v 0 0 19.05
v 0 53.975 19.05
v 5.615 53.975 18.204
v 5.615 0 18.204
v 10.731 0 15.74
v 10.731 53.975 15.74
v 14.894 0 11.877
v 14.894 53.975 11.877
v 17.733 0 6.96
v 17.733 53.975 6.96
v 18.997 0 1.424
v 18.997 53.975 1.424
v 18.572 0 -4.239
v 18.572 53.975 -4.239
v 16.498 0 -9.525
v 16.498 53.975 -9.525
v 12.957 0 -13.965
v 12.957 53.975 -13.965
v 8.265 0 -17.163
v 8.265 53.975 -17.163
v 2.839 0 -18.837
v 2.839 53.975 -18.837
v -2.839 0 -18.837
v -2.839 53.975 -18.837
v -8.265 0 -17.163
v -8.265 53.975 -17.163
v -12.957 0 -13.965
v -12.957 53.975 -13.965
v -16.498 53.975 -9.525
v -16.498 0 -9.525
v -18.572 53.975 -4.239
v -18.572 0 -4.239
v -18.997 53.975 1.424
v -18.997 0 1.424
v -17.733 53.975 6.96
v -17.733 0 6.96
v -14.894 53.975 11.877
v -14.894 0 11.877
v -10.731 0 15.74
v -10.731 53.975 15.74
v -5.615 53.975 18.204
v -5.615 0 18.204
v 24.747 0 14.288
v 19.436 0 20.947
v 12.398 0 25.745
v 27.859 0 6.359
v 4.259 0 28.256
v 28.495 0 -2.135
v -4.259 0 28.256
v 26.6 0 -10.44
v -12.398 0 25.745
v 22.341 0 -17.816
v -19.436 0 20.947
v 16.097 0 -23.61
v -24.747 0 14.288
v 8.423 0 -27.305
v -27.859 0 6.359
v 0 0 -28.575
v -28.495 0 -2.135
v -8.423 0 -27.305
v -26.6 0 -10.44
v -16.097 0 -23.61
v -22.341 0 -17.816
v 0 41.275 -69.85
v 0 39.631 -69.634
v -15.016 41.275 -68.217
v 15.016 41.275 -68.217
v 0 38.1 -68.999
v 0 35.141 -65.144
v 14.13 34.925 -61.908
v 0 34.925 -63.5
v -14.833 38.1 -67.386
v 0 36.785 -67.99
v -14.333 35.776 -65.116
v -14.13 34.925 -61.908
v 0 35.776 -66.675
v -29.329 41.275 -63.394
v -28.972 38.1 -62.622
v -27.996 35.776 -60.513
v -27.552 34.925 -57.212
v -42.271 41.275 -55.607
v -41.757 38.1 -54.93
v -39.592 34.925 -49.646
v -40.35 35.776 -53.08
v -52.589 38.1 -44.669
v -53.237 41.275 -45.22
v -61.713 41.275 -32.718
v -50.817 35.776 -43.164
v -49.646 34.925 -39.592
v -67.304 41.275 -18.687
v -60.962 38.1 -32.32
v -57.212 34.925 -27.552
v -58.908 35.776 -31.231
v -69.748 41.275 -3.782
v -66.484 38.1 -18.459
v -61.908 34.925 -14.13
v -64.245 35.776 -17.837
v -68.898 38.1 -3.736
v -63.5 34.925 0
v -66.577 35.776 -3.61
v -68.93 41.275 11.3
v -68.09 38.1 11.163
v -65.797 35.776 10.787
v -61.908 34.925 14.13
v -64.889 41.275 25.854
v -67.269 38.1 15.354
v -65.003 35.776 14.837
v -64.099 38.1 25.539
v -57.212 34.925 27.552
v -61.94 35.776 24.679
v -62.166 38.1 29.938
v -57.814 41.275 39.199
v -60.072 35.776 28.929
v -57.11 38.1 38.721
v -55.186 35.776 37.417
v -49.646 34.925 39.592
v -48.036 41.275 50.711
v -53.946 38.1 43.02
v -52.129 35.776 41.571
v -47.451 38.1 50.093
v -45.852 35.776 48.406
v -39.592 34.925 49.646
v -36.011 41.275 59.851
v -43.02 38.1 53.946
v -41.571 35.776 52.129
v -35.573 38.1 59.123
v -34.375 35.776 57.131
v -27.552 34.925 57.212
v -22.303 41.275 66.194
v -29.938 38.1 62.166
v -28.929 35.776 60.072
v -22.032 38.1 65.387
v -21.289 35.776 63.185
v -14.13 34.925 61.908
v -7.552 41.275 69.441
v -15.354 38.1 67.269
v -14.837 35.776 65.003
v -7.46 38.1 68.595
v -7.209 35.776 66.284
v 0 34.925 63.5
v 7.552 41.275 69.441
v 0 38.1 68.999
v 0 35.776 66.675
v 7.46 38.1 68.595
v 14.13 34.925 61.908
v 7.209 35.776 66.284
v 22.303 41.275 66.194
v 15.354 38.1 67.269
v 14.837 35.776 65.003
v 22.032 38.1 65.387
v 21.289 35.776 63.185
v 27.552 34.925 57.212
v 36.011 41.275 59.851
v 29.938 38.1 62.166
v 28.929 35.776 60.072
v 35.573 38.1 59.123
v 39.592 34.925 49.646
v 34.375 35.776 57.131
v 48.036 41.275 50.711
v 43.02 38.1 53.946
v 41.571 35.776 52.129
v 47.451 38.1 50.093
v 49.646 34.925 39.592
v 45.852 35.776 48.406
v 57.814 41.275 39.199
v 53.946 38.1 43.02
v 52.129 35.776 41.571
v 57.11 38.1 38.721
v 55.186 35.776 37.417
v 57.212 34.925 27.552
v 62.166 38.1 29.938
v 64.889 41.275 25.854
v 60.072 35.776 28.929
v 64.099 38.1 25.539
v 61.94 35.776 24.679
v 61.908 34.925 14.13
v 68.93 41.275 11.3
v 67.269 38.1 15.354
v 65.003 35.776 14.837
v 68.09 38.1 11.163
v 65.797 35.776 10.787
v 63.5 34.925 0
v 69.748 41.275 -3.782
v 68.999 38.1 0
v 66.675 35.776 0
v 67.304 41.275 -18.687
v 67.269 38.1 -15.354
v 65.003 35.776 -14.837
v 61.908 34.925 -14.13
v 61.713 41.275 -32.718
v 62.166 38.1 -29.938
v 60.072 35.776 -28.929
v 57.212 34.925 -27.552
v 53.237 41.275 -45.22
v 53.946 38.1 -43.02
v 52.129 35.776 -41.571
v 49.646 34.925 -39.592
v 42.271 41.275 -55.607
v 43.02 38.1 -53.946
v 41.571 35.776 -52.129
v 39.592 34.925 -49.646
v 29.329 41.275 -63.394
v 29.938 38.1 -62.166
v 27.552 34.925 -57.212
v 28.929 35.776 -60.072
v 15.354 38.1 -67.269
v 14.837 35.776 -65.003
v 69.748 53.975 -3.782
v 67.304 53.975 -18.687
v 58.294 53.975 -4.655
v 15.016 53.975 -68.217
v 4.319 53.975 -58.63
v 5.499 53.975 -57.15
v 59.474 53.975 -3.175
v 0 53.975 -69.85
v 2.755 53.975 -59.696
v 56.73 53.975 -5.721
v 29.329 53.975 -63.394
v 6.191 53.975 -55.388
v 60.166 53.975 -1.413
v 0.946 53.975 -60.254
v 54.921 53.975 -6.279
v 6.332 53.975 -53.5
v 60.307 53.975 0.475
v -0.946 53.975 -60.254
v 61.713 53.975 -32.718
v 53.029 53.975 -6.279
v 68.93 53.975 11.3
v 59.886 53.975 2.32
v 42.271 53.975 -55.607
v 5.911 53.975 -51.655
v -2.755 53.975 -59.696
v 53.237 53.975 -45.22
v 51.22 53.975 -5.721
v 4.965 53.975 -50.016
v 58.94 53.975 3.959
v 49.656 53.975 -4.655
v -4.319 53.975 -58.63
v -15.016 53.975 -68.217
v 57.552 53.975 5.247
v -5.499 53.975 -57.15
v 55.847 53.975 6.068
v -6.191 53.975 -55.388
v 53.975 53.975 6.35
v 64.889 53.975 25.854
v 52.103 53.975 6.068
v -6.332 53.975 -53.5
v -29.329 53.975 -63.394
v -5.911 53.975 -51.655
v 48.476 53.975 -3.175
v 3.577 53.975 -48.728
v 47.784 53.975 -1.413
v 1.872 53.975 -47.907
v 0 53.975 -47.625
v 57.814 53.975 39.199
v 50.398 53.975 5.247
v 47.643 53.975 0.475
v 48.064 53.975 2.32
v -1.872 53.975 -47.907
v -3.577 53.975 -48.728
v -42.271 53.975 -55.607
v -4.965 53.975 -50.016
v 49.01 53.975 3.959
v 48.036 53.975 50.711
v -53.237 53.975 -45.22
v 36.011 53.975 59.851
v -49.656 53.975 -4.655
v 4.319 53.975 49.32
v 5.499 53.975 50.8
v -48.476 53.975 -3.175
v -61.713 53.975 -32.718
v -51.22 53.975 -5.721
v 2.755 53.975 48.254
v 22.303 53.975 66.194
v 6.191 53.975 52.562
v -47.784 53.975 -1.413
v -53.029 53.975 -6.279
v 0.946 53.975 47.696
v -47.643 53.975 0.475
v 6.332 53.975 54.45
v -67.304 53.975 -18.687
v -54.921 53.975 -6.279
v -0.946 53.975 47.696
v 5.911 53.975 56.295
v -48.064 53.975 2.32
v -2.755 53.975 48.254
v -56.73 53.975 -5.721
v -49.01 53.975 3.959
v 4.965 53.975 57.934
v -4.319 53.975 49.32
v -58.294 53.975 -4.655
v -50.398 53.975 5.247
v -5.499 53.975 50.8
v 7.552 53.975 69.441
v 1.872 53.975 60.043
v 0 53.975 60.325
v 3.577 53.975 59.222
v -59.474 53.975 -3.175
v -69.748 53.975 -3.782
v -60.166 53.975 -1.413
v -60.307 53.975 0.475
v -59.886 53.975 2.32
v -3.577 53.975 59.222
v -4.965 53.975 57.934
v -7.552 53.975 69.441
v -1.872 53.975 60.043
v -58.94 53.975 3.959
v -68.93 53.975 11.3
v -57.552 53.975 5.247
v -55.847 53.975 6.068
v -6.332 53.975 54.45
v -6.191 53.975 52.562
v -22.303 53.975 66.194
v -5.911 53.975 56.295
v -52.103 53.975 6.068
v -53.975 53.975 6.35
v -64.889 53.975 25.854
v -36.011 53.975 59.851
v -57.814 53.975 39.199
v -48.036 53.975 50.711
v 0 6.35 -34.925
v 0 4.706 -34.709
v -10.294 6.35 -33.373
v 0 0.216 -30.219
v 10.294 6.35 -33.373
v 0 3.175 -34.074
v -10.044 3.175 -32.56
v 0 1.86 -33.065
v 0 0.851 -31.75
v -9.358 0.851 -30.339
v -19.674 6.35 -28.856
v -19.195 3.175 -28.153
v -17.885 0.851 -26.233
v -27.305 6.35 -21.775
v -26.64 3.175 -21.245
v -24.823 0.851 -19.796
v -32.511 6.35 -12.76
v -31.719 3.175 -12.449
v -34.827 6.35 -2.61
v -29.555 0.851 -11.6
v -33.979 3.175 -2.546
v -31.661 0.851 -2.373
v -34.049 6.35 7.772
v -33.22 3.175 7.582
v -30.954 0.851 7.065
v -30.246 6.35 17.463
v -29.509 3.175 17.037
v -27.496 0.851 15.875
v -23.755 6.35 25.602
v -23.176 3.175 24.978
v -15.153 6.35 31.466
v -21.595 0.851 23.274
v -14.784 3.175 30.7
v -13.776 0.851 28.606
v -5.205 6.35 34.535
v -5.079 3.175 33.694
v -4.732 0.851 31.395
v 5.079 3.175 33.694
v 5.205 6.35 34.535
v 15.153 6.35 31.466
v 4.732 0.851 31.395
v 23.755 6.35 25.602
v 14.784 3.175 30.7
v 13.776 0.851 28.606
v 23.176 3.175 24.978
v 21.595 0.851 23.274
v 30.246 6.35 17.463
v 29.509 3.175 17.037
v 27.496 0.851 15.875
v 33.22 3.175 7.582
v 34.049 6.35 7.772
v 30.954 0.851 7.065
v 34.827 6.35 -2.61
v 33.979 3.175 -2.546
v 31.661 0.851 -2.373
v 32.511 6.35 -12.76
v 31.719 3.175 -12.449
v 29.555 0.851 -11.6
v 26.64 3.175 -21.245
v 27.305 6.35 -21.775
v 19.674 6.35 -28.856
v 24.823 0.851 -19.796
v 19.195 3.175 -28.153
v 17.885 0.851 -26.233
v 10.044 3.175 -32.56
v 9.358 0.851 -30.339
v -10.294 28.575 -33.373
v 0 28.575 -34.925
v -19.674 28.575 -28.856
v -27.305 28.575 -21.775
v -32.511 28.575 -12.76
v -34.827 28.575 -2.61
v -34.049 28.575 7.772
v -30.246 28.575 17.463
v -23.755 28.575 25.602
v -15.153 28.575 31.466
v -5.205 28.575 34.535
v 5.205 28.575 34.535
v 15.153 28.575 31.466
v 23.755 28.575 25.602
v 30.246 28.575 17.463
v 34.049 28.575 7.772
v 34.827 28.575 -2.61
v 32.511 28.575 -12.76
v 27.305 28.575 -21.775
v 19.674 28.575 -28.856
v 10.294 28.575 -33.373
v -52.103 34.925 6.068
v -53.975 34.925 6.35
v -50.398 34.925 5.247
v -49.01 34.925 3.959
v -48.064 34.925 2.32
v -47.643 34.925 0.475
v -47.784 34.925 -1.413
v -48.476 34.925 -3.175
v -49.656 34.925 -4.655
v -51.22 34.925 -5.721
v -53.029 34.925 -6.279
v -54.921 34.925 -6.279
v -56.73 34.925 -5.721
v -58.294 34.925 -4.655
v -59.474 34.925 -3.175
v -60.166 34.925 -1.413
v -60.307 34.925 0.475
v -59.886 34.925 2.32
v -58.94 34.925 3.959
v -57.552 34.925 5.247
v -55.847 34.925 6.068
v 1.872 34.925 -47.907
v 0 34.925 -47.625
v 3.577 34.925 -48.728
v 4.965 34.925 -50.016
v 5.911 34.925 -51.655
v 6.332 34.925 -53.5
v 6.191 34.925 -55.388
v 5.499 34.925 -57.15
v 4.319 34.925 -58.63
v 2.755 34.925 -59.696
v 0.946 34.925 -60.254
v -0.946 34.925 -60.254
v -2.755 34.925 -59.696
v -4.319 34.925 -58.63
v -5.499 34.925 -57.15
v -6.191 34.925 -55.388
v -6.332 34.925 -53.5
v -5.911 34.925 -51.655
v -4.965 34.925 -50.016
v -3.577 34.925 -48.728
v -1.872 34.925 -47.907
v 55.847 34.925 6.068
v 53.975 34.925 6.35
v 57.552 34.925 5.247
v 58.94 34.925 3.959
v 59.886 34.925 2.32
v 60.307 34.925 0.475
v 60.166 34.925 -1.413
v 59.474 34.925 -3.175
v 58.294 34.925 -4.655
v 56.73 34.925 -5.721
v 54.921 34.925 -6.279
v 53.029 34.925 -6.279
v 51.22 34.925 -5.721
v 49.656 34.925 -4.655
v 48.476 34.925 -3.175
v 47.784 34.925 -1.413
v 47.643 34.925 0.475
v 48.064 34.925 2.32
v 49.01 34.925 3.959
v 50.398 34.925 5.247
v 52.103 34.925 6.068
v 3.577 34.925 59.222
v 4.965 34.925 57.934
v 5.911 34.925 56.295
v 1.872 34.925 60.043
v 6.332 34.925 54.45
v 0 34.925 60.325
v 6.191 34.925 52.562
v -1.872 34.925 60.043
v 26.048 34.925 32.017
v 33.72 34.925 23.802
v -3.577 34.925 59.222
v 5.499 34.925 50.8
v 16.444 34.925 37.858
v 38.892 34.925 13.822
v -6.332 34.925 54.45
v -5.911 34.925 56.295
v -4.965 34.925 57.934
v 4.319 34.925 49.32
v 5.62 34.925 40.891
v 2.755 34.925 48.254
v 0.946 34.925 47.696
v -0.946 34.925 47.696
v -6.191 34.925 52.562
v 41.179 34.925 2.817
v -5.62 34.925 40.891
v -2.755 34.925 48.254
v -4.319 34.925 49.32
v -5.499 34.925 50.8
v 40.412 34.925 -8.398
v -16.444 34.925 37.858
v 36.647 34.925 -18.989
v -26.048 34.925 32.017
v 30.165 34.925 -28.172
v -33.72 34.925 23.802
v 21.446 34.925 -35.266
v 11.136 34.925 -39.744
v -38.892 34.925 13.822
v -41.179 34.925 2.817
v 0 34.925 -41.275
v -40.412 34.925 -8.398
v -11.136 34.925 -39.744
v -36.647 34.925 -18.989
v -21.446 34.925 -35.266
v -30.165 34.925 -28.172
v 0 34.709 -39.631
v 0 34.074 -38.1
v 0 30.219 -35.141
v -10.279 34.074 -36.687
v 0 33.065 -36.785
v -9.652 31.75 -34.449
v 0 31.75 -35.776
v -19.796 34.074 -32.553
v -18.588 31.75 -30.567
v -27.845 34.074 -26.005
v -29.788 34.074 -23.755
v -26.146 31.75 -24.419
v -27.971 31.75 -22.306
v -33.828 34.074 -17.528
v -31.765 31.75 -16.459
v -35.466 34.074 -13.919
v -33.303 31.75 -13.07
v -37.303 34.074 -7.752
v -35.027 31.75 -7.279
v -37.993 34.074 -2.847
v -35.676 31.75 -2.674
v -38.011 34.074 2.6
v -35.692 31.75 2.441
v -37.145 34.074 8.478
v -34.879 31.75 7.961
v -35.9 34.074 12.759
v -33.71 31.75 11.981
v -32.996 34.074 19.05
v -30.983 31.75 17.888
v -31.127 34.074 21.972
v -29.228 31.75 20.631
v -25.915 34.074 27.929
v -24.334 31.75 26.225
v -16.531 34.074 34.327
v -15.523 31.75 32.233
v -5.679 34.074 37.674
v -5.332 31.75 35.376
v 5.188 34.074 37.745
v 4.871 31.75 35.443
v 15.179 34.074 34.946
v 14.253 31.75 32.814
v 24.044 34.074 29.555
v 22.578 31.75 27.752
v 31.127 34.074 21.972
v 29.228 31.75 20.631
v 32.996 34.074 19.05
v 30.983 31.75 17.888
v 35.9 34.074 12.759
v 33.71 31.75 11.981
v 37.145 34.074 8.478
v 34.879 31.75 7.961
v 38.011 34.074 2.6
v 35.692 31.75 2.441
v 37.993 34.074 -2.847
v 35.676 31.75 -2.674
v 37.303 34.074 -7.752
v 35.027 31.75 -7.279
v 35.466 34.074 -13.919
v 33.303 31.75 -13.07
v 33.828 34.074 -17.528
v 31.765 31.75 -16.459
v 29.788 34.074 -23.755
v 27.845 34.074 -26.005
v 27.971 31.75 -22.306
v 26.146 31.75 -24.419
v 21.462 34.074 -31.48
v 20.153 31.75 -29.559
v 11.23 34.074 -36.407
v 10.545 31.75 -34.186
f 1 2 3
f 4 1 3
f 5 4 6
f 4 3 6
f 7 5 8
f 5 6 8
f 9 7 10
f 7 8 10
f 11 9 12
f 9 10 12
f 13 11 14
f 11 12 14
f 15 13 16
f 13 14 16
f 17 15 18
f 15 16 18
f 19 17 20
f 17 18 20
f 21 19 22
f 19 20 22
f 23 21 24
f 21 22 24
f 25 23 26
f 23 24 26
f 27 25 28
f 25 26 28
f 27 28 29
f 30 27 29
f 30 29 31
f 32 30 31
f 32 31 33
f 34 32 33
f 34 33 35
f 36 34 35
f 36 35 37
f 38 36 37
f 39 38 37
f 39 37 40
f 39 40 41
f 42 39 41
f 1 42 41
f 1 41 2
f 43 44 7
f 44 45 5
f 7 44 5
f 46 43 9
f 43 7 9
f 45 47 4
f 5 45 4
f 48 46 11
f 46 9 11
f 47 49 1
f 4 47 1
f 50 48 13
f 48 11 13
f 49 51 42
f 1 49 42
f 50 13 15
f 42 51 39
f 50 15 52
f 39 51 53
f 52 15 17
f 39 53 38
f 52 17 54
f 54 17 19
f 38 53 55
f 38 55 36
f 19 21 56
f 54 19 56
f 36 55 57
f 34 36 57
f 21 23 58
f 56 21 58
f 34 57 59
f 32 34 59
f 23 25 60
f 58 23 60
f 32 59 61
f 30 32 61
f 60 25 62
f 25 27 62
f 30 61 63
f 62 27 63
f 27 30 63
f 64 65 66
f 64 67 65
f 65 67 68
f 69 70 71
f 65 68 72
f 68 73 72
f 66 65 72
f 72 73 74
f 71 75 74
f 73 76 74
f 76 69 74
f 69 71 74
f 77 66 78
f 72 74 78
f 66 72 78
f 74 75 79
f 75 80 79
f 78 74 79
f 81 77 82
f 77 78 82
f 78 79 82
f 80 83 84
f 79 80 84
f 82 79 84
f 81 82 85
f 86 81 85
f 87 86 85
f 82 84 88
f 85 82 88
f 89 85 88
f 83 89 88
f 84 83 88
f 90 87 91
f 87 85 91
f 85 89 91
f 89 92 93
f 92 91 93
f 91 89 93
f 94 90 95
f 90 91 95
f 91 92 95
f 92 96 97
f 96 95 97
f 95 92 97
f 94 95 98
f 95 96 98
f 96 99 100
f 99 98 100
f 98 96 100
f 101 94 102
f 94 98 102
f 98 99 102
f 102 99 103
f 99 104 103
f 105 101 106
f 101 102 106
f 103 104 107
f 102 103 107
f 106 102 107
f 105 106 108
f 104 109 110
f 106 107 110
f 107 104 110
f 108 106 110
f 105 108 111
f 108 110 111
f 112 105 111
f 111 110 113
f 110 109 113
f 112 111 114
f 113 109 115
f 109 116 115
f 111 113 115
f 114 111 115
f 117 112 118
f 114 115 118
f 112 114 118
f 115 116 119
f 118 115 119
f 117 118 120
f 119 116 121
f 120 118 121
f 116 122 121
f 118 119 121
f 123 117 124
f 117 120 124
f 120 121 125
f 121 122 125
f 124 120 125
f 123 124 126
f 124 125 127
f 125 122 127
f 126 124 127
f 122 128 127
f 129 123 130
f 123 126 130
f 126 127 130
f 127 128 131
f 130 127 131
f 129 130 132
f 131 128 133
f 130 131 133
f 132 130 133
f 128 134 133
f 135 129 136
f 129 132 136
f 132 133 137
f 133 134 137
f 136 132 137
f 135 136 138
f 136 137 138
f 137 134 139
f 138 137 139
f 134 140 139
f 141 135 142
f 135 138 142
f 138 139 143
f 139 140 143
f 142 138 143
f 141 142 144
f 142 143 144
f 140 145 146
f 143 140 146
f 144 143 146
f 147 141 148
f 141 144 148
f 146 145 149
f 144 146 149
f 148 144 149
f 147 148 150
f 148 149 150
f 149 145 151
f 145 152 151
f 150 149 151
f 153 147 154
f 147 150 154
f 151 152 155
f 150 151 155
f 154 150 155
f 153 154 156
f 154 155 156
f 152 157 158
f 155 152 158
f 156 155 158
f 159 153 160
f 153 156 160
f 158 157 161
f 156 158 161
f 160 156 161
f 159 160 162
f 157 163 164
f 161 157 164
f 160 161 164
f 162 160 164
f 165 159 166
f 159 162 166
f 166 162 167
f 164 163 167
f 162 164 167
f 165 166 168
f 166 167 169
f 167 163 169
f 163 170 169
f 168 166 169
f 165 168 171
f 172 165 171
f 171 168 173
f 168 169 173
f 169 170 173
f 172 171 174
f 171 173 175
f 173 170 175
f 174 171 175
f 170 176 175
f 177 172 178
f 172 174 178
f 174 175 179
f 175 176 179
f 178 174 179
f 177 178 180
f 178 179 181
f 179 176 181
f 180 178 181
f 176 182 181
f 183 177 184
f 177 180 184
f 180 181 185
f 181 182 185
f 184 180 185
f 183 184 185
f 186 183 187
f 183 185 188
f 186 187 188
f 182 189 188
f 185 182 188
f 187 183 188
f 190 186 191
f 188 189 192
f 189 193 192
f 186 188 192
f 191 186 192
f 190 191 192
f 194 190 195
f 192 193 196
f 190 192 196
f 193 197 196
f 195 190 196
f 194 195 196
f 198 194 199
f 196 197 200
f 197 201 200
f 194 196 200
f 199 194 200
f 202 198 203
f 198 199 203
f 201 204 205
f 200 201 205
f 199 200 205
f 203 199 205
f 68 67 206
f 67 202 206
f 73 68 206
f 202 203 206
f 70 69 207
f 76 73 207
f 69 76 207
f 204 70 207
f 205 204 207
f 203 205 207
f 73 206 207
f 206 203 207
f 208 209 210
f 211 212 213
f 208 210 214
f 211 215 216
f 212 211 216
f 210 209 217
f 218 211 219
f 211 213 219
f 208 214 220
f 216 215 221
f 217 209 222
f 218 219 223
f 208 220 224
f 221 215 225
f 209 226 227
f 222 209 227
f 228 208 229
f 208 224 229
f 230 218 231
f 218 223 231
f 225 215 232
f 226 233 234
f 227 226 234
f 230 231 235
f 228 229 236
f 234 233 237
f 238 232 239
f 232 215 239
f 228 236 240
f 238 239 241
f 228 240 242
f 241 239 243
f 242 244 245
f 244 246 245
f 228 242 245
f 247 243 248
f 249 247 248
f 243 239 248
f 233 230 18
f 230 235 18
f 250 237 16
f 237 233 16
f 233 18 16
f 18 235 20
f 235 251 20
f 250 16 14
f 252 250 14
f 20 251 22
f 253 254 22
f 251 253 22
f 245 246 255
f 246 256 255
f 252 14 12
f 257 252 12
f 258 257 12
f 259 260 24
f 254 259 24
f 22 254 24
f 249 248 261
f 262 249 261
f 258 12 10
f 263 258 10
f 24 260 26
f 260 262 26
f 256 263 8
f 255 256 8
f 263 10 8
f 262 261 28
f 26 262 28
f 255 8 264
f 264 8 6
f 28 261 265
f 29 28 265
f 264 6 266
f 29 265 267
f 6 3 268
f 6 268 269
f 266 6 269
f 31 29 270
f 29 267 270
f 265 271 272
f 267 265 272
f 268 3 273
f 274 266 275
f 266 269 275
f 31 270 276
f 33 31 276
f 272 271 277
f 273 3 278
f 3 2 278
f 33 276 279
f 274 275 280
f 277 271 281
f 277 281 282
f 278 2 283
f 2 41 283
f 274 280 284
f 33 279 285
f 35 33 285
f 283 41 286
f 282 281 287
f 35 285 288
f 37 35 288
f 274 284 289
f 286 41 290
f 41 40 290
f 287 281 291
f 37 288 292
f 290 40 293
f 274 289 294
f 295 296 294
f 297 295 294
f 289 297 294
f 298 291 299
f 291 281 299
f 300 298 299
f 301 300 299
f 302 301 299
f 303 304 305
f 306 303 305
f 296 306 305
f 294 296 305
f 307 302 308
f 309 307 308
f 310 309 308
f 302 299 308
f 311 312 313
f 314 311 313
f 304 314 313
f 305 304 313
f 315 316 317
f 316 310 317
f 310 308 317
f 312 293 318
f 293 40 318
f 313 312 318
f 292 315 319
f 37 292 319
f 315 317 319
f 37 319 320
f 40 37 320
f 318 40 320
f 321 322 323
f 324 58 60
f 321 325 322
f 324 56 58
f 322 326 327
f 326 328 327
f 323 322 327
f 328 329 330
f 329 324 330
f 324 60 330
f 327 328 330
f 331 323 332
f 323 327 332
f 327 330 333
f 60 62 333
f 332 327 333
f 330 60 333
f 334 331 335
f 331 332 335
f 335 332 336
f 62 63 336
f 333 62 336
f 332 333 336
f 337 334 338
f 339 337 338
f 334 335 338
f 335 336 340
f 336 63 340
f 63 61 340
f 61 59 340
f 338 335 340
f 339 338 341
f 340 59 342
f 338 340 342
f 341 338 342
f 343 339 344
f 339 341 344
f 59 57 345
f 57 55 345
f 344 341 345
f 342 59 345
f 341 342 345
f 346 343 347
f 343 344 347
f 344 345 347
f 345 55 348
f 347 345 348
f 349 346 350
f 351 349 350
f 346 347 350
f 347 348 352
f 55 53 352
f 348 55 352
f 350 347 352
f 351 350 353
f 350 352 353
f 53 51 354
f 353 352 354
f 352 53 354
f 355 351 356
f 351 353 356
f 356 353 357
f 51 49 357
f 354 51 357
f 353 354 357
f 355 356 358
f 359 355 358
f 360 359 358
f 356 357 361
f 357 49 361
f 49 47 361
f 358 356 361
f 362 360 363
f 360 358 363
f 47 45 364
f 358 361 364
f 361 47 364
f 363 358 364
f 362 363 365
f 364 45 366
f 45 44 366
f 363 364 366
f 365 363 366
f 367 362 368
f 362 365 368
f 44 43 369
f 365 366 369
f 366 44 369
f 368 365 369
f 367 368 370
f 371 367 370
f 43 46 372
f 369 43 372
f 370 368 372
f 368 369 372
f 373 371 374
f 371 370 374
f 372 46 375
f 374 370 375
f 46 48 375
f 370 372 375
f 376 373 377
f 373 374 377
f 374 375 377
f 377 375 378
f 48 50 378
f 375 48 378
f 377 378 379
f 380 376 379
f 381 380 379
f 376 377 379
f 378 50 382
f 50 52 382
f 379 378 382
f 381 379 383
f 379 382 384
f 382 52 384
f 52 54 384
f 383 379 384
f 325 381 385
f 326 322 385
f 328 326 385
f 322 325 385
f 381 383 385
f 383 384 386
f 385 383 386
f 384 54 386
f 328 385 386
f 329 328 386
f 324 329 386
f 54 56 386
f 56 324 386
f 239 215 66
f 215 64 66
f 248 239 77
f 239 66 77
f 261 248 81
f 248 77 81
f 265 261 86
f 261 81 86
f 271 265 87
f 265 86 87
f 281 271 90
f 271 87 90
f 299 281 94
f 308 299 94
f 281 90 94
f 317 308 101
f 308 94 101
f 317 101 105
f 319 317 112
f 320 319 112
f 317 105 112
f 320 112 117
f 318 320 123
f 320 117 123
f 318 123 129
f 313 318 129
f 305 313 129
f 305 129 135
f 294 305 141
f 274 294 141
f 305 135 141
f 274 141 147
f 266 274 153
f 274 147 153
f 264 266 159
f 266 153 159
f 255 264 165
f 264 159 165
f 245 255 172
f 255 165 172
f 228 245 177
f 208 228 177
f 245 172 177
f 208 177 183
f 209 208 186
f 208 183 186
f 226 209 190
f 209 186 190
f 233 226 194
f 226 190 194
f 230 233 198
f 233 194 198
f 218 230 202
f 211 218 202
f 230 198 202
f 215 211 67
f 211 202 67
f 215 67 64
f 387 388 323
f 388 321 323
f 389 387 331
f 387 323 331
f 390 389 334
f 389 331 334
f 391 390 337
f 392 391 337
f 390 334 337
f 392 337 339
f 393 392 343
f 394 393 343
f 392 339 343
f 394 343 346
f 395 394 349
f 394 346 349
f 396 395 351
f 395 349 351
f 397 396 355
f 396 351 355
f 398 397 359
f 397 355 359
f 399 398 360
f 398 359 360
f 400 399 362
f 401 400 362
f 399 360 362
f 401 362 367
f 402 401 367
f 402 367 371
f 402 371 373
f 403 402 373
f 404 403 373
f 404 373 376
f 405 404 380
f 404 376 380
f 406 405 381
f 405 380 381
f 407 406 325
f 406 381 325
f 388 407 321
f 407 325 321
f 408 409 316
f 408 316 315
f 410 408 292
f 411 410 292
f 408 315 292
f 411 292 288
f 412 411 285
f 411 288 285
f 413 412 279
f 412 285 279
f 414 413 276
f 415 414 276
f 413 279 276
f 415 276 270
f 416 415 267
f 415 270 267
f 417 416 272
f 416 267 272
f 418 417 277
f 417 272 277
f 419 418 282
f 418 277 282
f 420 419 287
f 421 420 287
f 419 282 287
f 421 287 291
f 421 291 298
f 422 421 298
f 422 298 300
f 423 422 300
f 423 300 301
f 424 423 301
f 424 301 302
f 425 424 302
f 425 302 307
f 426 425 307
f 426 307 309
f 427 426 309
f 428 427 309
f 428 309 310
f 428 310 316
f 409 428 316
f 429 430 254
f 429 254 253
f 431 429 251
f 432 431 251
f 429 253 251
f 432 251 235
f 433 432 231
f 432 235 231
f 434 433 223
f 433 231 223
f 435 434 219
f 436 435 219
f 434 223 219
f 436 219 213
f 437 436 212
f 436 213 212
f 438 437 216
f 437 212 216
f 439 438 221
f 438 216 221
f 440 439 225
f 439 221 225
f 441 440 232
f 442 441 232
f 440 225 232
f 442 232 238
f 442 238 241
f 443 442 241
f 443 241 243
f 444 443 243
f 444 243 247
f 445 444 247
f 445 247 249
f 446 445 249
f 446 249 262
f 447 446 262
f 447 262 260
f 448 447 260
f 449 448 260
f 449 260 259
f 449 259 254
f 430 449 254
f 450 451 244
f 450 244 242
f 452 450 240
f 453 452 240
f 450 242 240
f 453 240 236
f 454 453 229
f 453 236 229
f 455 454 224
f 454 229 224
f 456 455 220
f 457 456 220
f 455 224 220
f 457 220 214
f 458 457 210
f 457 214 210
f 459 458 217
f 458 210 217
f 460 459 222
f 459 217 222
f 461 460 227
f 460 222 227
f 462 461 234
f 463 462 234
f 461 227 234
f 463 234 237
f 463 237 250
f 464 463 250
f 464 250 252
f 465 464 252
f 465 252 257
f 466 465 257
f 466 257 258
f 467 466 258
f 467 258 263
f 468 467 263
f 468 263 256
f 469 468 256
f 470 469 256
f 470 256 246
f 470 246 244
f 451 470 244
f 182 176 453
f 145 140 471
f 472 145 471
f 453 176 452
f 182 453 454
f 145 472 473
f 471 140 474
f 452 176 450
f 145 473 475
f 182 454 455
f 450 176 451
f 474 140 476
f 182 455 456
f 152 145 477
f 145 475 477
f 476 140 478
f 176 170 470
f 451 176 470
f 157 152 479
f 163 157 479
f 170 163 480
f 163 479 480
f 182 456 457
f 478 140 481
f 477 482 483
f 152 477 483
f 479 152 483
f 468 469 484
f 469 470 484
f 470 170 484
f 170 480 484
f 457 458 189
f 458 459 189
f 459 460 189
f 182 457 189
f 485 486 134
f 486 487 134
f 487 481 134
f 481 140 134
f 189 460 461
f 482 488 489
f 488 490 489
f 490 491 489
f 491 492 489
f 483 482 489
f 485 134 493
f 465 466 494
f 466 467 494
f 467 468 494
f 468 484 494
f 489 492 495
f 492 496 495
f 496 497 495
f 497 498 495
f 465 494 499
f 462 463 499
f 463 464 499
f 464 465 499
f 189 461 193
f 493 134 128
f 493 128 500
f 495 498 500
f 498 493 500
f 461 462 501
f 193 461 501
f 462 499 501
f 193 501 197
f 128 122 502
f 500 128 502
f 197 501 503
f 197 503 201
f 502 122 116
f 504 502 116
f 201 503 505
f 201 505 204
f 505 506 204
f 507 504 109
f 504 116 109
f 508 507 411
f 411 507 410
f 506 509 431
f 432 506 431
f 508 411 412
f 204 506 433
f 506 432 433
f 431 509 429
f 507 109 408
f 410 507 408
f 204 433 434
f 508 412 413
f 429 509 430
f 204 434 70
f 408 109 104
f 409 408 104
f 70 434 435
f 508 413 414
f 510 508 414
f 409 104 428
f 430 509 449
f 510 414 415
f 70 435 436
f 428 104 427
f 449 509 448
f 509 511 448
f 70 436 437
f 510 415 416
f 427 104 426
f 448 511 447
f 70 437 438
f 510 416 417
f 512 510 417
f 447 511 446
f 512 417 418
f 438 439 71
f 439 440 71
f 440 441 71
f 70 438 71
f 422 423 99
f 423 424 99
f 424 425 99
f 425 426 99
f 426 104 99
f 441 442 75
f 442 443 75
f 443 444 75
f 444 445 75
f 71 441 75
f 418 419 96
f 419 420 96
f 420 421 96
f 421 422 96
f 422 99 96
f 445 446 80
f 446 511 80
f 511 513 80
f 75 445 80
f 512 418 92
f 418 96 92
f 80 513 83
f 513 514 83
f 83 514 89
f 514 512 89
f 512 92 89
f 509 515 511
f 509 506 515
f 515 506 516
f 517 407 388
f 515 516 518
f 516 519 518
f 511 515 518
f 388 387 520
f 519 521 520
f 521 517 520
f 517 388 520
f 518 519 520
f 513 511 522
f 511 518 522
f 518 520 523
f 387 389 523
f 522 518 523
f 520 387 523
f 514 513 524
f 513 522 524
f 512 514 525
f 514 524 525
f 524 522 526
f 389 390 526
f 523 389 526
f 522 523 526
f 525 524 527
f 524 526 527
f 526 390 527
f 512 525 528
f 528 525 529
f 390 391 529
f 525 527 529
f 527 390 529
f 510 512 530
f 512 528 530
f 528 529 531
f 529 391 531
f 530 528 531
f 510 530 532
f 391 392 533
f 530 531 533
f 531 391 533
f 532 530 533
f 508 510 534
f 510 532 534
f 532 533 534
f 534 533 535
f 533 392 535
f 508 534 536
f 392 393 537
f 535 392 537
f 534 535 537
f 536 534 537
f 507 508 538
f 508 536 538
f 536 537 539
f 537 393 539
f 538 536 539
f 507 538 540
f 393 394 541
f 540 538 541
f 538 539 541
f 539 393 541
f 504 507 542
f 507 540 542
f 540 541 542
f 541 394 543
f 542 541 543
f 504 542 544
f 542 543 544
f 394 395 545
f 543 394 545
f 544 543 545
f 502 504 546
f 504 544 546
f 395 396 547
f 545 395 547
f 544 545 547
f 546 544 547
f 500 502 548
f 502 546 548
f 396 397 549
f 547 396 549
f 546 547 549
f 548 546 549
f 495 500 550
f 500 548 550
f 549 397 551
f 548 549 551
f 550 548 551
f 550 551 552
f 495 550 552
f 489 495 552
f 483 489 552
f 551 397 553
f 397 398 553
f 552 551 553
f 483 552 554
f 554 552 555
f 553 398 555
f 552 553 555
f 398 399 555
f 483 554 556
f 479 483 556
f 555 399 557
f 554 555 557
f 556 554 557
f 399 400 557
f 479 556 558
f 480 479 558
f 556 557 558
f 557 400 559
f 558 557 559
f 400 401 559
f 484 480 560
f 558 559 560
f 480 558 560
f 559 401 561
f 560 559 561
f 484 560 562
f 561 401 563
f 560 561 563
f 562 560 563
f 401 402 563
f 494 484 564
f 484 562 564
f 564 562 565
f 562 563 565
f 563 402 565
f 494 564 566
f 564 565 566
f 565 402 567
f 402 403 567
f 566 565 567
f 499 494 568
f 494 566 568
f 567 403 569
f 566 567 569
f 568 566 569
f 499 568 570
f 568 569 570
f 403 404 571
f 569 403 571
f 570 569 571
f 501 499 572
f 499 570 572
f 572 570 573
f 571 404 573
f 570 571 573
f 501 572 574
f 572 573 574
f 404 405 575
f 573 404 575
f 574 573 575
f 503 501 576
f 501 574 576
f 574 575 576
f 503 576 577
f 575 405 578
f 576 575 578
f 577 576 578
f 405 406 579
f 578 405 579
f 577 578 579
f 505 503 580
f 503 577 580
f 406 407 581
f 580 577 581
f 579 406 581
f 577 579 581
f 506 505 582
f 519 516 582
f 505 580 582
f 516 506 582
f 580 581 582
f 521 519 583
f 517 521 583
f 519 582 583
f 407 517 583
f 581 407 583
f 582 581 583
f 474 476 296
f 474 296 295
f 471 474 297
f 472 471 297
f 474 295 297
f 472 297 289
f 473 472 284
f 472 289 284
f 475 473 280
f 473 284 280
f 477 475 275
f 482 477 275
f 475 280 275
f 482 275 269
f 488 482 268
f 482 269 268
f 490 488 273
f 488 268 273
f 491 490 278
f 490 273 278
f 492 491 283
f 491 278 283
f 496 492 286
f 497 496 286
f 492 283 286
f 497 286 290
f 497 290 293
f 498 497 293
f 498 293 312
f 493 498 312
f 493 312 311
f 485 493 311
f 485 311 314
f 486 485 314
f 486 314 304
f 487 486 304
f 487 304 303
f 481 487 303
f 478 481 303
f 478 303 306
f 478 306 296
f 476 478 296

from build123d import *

# Parameters (mm, degrees)
SKETCH2_R          = 19.05
SKETCH2_R_2        = 6.35
CUT_EXTRUDE1_DEPTH = 113.567071735


with BuildPart() as part:
    # Sketch1 → Revolve1 (revolve)
    with BuildSketch(Plane(origin=(0, 0, 0), x_dir=(0, 0, -1), z_dir=(1, 0, 0))):
        with BuildLine():
            Line((34.925, 28.575), (34.925, 6.35))
            ThreePointArc((34.925, 6.35), (33.065128061, 1.859871939), (28.575, 0))
            Line((28.575, 0), (0, 0))
            Line((0, 0), (0, 53.975))
            Line((0, 53.975), (69.85, 53.975))
            Line((69.85, 53.975), (69.85, 41.275))
            ThreePointArc((69.85, 41.275), (67.990128061, 36.784871939), (63.5, 34.925))
            Line((63.5, 34.925), (41.275, 34.925))
            ThreePointArc((41.275, 34.925), (36.784871939, 33.065128061), (34.925, 28.575))
        make_face()
    revolve(axis=Axis((0, 0, 0), (0, 1, 0)))

    # Sketch2 → Cut-Extrude1 (cut, through all)
    with BuildSketch(Plane(origin=(0, 53.975, 0), x_dir=(1, 0, 0), z_dir=(0, 1, 0))):
        with Locations(Location((0, 0, 0), (0, 0, 270))):
            Circle(SKETCH2_R)
        with Locations(Location((0, 53.975, 0), (0, 0, 270))):
            Circle(SKETCH2_R_2)
        with Locations(Location((53.975, 0, 0), (0, 0, 270))):
            Circle(SKETCH2_R_2)
        with Locations(Location((0, -53.975, 0), (0, 0, 270))):
            Circle(SKETCH2_R_2)
        with Locations(Location((-53.975, 0, 0), (0, 0, 270))):
            Circle(SKETCH2_R_2)
    extrude(amount=-CUT_EXTRUDE1_DEPTH, mode=Mode.SUBTRACT)


solid = part.part
